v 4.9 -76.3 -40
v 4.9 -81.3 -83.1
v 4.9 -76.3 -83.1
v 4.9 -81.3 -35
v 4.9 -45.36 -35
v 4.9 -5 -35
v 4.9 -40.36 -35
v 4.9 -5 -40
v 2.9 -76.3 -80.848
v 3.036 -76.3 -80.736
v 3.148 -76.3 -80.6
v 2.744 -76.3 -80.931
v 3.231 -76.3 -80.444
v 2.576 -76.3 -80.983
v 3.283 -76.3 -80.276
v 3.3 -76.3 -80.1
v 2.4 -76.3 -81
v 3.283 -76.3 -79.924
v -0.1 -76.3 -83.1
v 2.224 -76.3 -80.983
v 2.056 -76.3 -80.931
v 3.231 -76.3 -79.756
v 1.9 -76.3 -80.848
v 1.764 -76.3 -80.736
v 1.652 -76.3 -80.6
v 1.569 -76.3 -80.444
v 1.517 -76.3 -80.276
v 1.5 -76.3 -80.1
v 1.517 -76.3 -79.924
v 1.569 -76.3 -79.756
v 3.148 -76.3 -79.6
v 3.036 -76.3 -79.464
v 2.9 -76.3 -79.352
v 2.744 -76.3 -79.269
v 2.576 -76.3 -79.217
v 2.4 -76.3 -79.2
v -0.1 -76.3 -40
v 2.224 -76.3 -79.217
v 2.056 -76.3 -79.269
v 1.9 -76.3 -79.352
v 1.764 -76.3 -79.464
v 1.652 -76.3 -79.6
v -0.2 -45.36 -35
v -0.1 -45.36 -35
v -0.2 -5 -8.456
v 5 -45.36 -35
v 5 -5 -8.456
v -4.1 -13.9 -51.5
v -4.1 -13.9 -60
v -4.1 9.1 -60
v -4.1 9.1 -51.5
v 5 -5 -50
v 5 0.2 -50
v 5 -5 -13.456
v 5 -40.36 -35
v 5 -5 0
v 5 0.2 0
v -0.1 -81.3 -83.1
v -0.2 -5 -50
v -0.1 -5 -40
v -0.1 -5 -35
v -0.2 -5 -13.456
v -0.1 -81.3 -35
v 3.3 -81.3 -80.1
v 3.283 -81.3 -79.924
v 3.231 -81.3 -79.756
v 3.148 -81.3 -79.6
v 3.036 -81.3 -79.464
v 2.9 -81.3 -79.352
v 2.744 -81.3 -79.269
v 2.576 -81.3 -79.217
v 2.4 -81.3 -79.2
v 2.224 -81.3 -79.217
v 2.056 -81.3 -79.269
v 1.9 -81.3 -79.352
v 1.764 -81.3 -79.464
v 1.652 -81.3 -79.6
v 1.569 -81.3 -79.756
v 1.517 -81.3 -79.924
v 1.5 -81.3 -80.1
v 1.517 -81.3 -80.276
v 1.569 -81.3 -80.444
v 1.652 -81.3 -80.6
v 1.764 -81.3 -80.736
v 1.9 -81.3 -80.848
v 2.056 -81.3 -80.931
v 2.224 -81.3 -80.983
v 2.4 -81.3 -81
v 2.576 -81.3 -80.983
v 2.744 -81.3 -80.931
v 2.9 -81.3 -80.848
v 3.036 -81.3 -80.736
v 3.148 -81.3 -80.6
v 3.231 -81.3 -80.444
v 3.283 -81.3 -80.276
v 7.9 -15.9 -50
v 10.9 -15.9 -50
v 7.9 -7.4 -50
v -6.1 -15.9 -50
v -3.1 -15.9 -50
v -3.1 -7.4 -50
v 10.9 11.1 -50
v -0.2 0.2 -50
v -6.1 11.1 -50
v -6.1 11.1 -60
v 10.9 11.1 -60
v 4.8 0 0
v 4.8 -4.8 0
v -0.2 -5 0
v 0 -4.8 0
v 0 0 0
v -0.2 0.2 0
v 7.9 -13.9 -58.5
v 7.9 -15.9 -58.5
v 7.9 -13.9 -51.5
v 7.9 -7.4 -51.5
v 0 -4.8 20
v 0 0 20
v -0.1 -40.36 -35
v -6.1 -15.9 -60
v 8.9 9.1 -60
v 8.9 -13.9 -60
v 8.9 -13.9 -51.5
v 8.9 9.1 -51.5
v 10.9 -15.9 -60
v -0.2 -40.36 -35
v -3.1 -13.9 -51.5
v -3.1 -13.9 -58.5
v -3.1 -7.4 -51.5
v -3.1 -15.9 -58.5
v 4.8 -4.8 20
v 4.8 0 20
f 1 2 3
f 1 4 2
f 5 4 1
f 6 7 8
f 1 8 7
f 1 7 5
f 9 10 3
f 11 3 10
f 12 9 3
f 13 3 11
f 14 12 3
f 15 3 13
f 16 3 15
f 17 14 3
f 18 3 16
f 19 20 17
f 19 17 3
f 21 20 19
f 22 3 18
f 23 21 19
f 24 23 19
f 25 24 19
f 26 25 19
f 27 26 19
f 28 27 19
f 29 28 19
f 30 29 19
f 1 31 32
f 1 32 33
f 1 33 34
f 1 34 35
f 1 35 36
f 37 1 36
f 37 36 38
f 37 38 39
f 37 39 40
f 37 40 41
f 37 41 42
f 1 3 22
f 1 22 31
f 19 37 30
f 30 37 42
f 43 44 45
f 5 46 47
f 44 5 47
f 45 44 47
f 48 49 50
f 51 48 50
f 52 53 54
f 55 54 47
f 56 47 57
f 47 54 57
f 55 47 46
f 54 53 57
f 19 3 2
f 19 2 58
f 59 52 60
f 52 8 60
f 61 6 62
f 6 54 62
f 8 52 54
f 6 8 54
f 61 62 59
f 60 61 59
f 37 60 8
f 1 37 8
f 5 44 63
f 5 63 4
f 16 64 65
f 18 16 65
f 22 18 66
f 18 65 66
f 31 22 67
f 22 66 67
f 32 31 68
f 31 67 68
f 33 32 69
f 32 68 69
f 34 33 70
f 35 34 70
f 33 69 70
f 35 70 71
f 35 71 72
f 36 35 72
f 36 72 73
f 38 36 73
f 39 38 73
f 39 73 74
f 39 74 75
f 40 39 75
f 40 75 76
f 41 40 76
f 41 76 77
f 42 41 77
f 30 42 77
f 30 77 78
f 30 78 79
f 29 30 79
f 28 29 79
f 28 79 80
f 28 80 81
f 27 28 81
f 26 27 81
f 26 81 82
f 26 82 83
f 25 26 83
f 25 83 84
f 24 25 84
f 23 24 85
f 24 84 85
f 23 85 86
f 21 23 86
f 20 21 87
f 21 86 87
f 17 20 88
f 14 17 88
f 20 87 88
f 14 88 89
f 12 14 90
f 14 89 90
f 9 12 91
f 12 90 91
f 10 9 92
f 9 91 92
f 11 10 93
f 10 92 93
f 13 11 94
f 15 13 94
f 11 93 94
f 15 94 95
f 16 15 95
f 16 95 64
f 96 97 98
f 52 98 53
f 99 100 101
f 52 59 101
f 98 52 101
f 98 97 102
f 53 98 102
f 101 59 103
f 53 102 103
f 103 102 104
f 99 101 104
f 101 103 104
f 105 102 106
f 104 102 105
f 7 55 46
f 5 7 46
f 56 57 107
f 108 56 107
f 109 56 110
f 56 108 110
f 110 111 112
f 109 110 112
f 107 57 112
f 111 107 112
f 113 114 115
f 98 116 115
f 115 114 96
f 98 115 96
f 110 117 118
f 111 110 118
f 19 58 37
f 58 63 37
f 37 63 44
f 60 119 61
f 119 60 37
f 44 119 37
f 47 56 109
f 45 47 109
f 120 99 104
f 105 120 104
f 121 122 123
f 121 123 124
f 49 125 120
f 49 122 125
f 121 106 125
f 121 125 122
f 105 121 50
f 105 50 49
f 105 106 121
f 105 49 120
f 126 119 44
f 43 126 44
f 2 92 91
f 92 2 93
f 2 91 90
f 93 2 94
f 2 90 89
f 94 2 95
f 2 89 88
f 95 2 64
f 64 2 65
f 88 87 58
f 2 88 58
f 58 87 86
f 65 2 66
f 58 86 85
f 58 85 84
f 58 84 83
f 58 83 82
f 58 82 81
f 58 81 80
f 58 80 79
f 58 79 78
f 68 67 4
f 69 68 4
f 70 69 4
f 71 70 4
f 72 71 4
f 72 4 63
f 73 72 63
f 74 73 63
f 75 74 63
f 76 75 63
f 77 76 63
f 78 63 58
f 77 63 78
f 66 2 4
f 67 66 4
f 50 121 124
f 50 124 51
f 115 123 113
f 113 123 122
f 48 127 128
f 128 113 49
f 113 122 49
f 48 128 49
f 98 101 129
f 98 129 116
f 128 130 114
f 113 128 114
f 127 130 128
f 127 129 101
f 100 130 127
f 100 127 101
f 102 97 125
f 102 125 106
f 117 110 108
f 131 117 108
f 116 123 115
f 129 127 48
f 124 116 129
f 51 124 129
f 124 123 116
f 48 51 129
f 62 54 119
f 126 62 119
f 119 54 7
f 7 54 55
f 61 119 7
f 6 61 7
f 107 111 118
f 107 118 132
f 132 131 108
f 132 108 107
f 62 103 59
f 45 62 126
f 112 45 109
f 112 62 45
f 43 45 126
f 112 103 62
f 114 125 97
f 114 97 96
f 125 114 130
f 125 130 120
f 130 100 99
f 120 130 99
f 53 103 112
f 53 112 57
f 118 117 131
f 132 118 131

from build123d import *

# Parameters (mm, degrees)
SKETCH1_W           = 4.8
SKETCH1_H           = 4.8
BOSS_EXTRUDE1_DEPTH = 20
SKETCH2_W           = 5.2
SKETCH2_H           = 5.2
BOSS_EXTRUDE2_DEPTH = 50
SKETCH3_W           = 17
SKETCH3_H           = 27
BOSS_EXTRUDE3_DEPTH = 10
SKETCH4_W           = 13
SKETCH4_H           = 23
CUT_EXTRUDE1_DEPTH  = 8.5
SKETCH5_W           = 11
SKETCH5_H           = 8.5
CUT_EXTRUDE2_DEPTH  = 8.5
SKETCH6_W           = 5
SKETCH6_H           = 5
BOSS_EXTRUDE4_DEPTH = 81.5
SKETCH7_W           = 5
SKETCH7_H           = 5
BOSS_EXTRUDE5_DEPTH = 43.1
SKETCH9_R           = 0.9
CUT_EXTRUDE4_DEPTH  = 125.748466924
BOSS_EXTRUDE6_DEPTH = 5.2


with BuildPart() as part:
    # Sketch1 → Boss-Extrude1 (new body)
    with BuildSketch(Plane.XY):
        with Locations((2.4, -2.4)):
            Rectangle(SKETCH1_W, SKETCH1_H)
    extrude(amount=BOSS_EXTRUDE1_DEPTH)

    # Sketch2 → Boss-Extrude2 (add)
    with BuildSketch(Plane(origin=(0, 0, 0), x_dir=(-1, 0, 0), z_dir=(0, 0, -1))):
        with Locations((-2.4, -2.4)):
            Rectangle(SKETCH2_W, SKETCH2_H)
    extrude(amount=BOSS_EXTRUDE2_DEPTH)

    # Sketch3 → Boss-Extrude3 (add)
    with BuildSketch(Plane(origin=(0, 0, -50), x_dir=(-1, 0, 0), z_dir=(0, 0, -1))):
        with Locations((-2.4, -2.4)):
            Rectangle(SKETCH3_W, SKETCH3_H)
    extrude(amount=BOSS_EXTRUDE3_DEPTH)

    # Sketch4 → Cut-Extrude1 (cut)
    with BuildSketch(Plane(origin=(0, 0, -60), x_dir=(-1, 0, 0), z_dir=(0, 0, -1))):
        with Locations((-2.4, -2.4)):
            Rectangle(SKETCH4_W, SKETCH4_H)
    extrude(amount=-CUT_EXTRUDE1_DEPTH, mode=Mode.SUBTRACT)

    # Sketch5 → Cut-Extrude2 (cut)
    with BuildSketch(Plane.XZ.offset(15.9)):
        with Locations((2.4, -54.25)):
            Rectangle(SKETCH5_W, SKETCH5_H)
    extrude(amount=-CUT_EXTRUDE2_DEPTH, mode=Mode.SUBTRACT)

    # Sketch6 → Boss-Extrude4 (add)
    with BuildSketch(Plane(origin=(0, 0.2, 0), x_dir=(1, 0, 0), z_dir=(0, 1, 0))):
        with Locations((2.4, 37.5)):
            Rectangle(SKETCH6_W, SKETCH6_H)
    extrude(amount=-BOSS_EXTRUDE4_DEPTH)

    # Sketch7 → Boss-Extrude5 (add)
    with BuildSketch(Plane(origin=(0, 0, -40), x_dir=(-1, 0, 0), z_dir=(0, 0, -1))):
        with Locations((-2.4, -78.8)):
            Rectangle(SKETCH7_W, SKETCH7_H)
    extrude(amount=BOSS_EXTRUDE5_DEPTH)

    # Sketch9 → Cut-Extrude4 (cut, through all)
    with BuildSketch(Plane.XZ.offset(81.3)):
        with Locations((2.4, -80.1)):
            Circle(SKETCH9_R)
    extrude(amount=-CUT_EXTRUDE4_DEPTH, mode=Mode.SUBTRACT)

    # Sketch12 → Boss-Extrude6 (add)
    with BuildSketch(Plane(origin=(5, 0, 0), x_dir=(0, 0, -1), z_dir=(1, 0, 0))):
        Polygon((13.455782968, -5), (35, -40.359932103), (35, -45.359932103), (8.455782968, -5), align=None)
    extrude(amount=-BOSS_EXTRUDE6_DEPTH)


solid = part.part
